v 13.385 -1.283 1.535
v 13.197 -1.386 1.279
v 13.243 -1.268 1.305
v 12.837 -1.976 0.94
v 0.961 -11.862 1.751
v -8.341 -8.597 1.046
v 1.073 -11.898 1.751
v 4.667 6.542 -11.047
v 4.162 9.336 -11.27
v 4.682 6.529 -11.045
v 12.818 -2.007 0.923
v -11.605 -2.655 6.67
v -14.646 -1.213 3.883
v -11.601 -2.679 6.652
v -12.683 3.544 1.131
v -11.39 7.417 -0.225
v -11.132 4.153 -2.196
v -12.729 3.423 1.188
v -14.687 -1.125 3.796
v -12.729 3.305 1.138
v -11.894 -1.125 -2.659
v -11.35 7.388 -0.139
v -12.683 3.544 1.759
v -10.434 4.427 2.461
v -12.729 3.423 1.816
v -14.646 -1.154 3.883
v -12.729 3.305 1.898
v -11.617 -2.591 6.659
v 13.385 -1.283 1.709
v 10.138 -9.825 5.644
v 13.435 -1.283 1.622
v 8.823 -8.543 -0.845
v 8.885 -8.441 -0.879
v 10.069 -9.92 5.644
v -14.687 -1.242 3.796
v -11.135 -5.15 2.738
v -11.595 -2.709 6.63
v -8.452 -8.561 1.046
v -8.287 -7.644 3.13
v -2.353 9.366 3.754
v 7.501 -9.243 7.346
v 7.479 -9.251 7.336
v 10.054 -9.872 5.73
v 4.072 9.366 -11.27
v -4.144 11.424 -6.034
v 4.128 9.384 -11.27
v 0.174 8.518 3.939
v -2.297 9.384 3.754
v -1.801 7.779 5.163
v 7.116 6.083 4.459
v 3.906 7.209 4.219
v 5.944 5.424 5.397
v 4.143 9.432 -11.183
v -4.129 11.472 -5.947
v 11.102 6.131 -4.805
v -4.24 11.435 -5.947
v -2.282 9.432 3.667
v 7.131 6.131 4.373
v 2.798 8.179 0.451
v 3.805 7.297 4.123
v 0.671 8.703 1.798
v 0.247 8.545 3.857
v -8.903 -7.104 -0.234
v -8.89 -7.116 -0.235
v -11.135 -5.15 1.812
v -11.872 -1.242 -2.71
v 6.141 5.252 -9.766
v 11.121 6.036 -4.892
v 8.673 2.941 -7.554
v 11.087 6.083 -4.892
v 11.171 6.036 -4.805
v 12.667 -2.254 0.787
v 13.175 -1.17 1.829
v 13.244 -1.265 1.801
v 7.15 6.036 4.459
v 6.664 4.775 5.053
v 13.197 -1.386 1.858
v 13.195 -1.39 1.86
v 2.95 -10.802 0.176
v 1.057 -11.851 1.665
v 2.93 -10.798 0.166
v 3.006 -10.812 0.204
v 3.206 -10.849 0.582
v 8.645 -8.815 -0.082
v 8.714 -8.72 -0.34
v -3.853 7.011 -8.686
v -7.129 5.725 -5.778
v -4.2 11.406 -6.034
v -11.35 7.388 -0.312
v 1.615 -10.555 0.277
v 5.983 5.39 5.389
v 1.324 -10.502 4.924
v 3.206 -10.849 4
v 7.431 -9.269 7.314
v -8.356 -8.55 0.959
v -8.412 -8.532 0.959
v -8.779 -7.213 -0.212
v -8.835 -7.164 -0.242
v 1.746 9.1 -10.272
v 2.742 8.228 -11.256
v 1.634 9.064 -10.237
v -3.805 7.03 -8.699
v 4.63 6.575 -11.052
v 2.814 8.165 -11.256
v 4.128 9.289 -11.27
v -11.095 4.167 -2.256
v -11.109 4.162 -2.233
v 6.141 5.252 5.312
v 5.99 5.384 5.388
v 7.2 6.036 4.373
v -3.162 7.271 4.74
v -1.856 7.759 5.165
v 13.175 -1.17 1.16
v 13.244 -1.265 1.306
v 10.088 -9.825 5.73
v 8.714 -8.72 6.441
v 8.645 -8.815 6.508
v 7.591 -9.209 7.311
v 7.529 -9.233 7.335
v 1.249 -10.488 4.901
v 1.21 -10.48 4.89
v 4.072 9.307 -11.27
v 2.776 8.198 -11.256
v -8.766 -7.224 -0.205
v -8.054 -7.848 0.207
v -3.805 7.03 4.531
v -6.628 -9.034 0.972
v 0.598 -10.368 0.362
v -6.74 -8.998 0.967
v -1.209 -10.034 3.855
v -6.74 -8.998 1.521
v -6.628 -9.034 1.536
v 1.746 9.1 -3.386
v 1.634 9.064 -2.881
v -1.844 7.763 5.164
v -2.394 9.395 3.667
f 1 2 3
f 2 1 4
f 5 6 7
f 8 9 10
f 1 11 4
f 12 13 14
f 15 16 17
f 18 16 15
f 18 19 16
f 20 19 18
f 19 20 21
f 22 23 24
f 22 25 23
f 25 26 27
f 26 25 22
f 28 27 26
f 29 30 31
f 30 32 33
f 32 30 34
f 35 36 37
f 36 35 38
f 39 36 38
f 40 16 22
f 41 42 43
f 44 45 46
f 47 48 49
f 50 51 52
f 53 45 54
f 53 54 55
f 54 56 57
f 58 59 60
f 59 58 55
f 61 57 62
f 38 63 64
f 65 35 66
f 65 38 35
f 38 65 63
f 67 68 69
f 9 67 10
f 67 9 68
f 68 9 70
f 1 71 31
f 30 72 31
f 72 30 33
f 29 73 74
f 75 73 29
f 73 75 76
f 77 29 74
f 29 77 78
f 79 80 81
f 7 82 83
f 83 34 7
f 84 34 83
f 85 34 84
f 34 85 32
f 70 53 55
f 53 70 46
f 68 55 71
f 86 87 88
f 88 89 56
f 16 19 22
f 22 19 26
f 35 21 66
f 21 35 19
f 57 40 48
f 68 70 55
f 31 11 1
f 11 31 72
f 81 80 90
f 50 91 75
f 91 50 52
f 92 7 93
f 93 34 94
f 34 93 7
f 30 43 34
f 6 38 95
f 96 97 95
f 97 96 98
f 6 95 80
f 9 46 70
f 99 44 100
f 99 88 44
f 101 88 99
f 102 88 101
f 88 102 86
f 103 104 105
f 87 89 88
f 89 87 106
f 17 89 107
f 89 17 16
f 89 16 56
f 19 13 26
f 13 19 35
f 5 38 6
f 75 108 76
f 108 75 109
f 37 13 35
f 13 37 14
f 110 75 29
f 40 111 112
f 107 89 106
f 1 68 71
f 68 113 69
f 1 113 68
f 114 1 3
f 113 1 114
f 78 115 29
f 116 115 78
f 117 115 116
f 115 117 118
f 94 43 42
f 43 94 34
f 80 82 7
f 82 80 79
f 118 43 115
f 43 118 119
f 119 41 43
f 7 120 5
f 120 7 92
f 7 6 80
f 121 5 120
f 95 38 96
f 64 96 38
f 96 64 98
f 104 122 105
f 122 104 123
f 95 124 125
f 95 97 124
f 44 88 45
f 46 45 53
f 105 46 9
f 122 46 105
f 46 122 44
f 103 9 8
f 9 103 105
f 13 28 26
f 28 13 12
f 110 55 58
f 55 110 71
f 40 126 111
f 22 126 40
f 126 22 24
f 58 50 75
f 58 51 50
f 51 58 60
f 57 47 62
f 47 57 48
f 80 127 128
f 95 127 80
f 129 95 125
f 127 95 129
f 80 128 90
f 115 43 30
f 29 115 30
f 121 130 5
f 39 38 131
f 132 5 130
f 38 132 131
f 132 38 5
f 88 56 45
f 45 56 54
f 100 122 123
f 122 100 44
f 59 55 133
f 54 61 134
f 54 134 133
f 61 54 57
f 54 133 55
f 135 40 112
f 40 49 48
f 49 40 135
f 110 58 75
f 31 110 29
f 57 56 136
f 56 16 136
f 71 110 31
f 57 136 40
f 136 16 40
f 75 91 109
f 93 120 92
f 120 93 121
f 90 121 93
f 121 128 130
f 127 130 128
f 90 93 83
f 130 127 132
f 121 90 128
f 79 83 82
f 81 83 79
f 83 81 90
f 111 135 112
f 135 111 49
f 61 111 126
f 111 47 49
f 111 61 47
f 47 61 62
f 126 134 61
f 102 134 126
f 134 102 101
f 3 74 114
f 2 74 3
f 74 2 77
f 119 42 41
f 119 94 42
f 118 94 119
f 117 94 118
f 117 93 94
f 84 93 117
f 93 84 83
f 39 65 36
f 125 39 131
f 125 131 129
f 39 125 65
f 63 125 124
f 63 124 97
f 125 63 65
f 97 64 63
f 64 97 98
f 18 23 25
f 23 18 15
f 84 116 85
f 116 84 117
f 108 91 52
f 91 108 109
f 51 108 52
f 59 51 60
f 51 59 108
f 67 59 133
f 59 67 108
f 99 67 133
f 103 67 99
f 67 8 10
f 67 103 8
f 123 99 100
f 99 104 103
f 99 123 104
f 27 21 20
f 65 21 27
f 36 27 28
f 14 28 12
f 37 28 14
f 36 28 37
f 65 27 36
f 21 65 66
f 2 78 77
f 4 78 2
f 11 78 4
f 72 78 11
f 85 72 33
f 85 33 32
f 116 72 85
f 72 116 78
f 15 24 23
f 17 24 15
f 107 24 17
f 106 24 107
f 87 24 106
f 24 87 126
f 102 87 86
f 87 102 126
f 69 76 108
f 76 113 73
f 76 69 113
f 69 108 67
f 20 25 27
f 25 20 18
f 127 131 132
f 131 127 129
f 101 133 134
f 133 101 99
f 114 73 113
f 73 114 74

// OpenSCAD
// Auto-generated OpenSCAD file

    inner_points = 10*[[-0.8207364448332389, -0.03625987639799513, -1.077103005931804], [-0.3800079511582095, 0.6775294643132357, 1.0518242237897182], [1.314406218043804, -0.12649016604771388, -0.2591223940027388], [-1.2601675662397096, 0.3485174868667573, -0.26540930122634293], [0.6033917278936528, 0.4960926858162208, 1.0542256086650177], [0.7704376603984122, -0.3298307508154513, -1.0732174835834996], [-0.6659377447570157, -0.8939163933116565, -0.5867330828632719], [-0.5614003085180945, -0.3057984452791665, 1.03905571142295], [0.8614304919402382, -0.8720125870409337, 0.22976339159278825], [-1.105368866163486, -0.5091390300469038, 0.2249606218421892], [0.42199937053376757, -0.4872352237761812, 1.0414570962982492], [0.31746193429484665, -1.0753531718086713, -0.5843316979879724], [-0.3724387452492543, 0.6971415864952342, -0.5660731958680674], [0.17152981239613735, 0.9004821712629716, 0.24802189371269331], [0.6109609338026081, 0.5157048079982192, -0.5636718109927679], [-0.1143999812026689, -0.6709636863619204, -1.390535412940297], [-1.2648455927592903, 0.33639652876676684, 0.7345062944329209], [1.3097281915242232, -0.13861112414770457, 0.7407932016565248]];

    outer_points = 10*[[-0.7646716571891983, -0.4484124824111452, 1.017411015424149], [1.3334724658866113, -0.12832498152302135, 0.16218986970952987], [-0.4159593615000292, 1.137644887460793, -0.5946962179229037], [0.17664237883325157, -0.7784874133111438, 1.0879689744258578], [1.1071187428716376, 0.6035724304303223, -0.48053104208131747], [-1.1309196745075054, 0.7358224064074482, -0.022533265133765135], [-0.837148057149246, -0.8502349634644899, 0.10456608600351325], [0.8191262918806799, -0.7784874133111438, -0.39703890778391676], [-0.3485414671567439, 0.2834849295421984, -1.1103177785764728], [0.10416597887320383, -1.1803098943644885, 0.17512404500522194], [0.5927725688657061, -0.046590001357800344, -1.0397598195747642], [-1.06350178016422, -0.1183375515111464, -0.5381548257873341], [-0.00491846562418119, 0.20174994937697738, 1.009417255474962], [0.7100418473832949, 0.6035724304303223, 0.43725430268582344], [-0.23127218863915502, 0.9336473613303209, 0.3666963436841147], [-1.4605786756525627, -0.1183375515111464, 0.3796305189798069], [1.0038134647415542, -0.9824849394416157, 0.5643536538231018], [0.41121172440827325, 0.9336473613303209, -1.1183115385256597]];

    // Convex hull for inner set (I)
    module inner_hull() {
        hull() {
            for (p = inner_points) {
                translate(p) sphere(r=0.1);
            }
        }
    }

    // Convex hull for outer set (O) minus inner hull (O \ I)
    module outer_minus_inner() {
        difference() {
            hull() {
                for (p = outer_points) {
                    translate(p) sphere(r=0.1);
                }
            }
            inner_hull(); // Subtract inner hull
        }
    }

    // Convex hull for outer set (O) minus all translated inner hulls
    module outer_minus_AllTranslationInner() {
        difference() {
            hull() {
                for (p = outer_points) {
                    translate(p) sphere(r=0.1);
                }
            }
            hull() {
                translate([0,0,50]) inner_hull();
                translate([0,0,-50]) inner_hull();
            }; // Subtract translated inner hulls
        }
    }

    // Difference between outer_minus_inner and outer_minus_AllTranslationInner
    module outer_minus_inner_diff() {
        difference() {
            // Outer minus inner
            difference() {
                hull() {
                    for (p = outer_points) {
                        translate(p) sphere(r=0.1);
                    }
                }
                inner_hull();
            }

            // Subtract Outer minus AllTranslationInner
            difference() {
                hull() {
                    for (p = outer_points) {
                        translate(p) sphere(r=0.1);
                    }
                }
                hull() {
                    translate([0,0,50]) inner_hull();
                    translate([0,0,-50]) inner_hull();
                };
            }
        }
    }

    // Rendering all with colors applied
    color([0, 1, 0, 1]) outer_minus_AllTranslationInner(); // Opaque green
    
